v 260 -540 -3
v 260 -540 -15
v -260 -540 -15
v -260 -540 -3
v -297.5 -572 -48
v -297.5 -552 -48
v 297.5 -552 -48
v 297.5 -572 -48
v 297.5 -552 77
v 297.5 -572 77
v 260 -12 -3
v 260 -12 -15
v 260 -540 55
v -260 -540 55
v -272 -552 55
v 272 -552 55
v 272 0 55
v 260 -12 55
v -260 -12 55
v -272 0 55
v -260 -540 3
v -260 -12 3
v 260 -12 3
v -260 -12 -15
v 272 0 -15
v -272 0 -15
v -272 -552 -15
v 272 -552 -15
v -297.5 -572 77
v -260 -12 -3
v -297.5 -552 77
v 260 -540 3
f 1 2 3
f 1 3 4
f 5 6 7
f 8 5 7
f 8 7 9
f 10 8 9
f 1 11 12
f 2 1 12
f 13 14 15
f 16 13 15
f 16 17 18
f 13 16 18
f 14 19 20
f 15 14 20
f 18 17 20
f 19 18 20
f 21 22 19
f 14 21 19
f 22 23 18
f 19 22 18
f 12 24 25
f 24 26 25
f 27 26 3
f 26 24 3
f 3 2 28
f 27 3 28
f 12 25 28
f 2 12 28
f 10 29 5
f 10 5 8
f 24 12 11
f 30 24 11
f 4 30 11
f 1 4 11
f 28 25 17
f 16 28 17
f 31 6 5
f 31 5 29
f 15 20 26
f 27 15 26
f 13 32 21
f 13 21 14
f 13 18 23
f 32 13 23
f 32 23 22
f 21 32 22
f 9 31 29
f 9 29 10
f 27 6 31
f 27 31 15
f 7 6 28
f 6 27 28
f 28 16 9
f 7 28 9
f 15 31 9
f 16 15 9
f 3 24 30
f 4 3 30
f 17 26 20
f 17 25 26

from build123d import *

# Parameters (mm, degrees)
F1_DEPTH = 552
F2_W     = 12
F2_H     = 70
F3_DEPTH = 520
F4_W     = 595
F4_H     = 125
F5_DEPTH = 20


with BuildPart() as f1:
    # F0 (on Front) → F1 (new body)
    with BuildSketch(Plane.XZ):
        Polygon((260, 55), (260, 3), (-260, 3), (-260, 55), (-272, 55), (-272, -15), (-260, -15), (-260, -3), (260, -3), (260, -15), (272, -15), (272, 55), align=None)
    extrude(amount=F1_DEPTH)

    # F2 (on face) → F3 (join)
    with BuildSketch(Plane(origin=(260, 0, 0), x_dir=(0, -1, 0), z_dir=(-1, 0, 0))):
        with Locations((6, 20)):
            Rectangle(F2_W, F2_H)
        with Locations((546, 20)):
            Rectangle(F2_W, F2_H)
    extrude(amount=F3_DEPTH)

    # F4 (on face) → F5 (join)
    with BuildSketch(Plane.XZ.offset(552)):
        with Locations((0, 14.5)):
            Rectangle(F4_W, F4_H)
    extrude(amount=F5_DEPTH)


solid = f1.part
